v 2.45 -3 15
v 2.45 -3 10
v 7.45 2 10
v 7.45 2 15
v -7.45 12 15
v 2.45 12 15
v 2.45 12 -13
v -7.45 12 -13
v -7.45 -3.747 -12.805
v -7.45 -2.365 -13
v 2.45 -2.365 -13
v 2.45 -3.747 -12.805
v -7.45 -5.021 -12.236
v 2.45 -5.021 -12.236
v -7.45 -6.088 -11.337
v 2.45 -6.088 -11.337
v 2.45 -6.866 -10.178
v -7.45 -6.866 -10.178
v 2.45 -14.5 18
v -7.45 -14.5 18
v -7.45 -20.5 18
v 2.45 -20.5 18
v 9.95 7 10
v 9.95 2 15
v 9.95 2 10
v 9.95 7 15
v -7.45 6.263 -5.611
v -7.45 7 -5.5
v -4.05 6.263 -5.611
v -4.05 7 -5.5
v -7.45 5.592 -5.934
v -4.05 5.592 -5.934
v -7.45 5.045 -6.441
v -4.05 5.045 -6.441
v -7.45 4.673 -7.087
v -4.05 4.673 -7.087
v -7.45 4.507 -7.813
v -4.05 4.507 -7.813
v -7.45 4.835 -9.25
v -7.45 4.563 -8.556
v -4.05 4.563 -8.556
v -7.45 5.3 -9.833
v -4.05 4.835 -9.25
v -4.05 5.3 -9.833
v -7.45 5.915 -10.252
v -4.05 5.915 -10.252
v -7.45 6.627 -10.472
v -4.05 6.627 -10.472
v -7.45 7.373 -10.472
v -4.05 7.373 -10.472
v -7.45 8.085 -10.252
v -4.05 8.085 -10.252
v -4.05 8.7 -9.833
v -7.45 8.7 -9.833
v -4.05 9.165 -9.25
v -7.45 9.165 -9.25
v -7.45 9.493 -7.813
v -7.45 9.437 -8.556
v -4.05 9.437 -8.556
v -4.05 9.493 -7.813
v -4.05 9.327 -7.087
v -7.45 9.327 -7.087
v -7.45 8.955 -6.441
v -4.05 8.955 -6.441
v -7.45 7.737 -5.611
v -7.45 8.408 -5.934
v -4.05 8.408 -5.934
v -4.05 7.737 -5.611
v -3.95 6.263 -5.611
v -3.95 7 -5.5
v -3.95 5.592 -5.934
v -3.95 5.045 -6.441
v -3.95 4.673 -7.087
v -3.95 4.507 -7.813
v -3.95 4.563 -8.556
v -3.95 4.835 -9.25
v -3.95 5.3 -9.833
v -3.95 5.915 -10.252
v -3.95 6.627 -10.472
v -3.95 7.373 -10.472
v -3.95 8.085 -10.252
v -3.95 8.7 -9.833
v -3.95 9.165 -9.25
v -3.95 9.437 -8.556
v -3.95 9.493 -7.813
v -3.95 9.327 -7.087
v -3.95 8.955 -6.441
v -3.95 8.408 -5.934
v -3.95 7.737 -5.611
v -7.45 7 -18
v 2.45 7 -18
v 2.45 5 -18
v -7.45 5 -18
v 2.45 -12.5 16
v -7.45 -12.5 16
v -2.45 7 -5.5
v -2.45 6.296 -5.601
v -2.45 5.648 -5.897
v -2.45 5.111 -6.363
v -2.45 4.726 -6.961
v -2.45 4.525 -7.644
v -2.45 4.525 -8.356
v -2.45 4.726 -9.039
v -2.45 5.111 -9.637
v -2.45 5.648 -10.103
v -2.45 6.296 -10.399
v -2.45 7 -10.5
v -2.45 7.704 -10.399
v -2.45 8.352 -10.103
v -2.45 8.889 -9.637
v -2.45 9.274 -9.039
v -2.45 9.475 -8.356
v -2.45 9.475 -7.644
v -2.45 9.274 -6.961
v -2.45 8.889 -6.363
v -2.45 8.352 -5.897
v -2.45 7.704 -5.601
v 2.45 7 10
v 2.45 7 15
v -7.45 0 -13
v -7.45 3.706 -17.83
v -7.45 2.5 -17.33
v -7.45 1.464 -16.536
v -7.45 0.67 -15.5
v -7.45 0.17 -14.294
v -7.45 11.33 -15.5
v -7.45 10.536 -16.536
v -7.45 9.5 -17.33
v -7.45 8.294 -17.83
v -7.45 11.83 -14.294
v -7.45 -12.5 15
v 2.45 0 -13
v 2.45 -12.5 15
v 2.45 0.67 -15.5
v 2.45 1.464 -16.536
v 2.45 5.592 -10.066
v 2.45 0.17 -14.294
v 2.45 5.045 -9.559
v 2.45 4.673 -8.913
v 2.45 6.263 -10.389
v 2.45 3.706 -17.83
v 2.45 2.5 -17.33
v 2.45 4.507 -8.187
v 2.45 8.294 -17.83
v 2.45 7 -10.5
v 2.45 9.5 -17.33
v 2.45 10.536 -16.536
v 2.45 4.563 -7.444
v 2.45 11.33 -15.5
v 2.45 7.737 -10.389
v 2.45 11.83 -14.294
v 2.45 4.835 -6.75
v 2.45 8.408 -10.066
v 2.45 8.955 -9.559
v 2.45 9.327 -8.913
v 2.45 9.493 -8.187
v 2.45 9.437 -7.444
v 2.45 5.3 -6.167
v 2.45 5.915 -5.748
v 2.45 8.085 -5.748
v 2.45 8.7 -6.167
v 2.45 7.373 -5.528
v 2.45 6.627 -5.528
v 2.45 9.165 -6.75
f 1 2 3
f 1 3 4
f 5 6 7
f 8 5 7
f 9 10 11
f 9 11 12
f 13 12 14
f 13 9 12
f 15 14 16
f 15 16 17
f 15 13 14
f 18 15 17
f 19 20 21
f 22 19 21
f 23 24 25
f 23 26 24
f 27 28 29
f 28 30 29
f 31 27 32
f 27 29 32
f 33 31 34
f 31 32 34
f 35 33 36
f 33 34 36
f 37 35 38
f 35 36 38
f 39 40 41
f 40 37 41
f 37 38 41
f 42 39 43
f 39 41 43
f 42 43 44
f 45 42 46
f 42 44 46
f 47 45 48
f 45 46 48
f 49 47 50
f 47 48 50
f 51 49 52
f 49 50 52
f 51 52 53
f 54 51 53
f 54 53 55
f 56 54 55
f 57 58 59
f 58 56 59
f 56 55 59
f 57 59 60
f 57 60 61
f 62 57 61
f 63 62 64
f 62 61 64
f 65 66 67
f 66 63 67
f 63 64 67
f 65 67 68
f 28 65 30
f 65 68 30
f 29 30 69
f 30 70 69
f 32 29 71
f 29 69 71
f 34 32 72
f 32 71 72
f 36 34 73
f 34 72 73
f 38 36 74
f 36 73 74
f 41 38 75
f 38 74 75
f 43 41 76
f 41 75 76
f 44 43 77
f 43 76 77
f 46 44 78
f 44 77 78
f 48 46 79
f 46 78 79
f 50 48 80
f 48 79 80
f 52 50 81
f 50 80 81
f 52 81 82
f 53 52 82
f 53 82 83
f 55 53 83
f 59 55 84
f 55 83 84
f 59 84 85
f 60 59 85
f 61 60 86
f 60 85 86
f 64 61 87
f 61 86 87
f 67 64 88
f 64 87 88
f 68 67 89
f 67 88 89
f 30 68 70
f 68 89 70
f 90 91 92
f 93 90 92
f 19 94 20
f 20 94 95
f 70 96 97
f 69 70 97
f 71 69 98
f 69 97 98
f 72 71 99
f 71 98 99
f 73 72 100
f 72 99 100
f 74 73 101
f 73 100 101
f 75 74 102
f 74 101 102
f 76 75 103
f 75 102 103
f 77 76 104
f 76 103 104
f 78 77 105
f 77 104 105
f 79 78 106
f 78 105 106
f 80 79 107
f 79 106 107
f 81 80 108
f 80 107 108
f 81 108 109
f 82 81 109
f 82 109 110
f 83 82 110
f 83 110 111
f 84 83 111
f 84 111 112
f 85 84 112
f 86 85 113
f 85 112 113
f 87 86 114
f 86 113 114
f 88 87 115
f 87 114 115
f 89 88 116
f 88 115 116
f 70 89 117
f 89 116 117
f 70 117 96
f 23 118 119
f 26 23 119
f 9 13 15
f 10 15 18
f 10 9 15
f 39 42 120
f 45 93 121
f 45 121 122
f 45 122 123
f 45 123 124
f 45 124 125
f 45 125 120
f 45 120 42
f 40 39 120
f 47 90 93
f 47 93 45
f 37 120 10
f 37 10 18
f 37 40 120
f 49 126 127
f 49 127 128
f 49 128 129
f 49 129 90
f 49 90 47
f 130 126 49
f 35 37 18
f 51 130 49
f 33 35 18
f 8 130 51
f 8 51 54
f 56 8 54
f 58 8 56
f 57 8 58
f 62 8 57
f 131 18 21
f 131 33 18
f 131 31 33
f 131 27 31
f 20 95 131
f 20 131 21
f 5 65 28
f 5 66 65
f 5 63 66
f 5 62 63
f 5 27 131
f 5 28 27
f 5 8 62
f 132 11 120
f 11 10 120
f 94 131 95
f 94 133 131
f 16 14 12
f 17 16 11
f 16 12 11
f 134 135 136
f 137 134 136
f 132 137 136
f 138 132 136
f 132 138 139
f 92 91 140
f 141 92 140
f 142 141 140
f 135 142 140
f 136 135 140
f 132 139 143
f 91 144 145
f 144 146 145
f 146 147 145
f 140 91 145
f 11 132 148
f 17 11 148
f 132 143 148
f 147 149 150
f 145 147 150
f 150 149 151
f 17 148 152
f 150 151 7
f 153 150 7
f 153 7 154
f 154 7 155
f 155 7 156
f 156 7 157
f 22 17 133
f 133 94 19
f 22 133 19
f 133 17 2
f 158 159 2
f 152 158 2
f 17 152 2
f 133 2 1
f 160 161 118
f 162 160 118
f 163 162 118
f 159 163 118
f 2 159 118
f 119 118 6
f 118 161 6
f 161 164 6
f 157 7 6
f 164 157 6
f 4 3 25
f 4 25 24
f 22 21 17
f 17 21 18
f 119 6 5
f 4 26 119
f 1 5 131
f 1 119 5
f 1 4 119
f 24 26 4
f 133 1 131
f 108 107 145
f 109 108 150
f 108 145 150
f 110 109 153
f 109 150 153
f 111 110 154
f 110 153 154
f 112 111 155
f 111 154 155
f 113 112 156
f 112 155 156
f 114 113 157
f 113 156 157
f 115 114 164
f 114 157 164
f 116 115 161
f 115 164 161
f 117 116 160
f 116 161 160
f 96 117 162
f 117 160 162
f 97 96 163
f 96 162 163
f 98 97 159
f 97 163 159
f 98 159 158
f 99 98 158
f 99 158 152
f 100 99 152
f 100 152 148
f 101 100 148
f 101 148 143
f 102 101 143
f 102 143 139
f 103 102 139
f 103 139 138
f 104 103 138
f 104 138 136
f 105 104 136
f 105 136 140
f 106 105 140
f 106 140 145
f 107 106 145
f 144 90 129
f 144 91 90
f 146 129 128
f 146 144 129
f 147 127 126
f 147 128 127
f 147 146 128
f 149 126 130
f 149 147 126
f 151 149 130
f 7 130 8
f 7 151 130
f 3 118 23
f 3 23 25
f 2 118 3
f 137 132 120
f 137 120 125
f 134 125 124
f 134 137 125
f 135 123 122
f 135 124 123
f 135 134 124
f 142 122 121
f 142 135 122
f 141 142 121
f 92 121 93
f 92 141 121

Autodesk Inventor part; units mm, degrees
ref_plane "YZ Plane" through (0, 0, 0) normal (1, 0, 0) x (0, 1, 0)
ref_plane "XZ Plane" through (0, 0, 0) normal (0, 1, 0) x (-1, 0, 0)
ref_plane "XY Plane" through (0, 0, 0) normal (0, 0, 1) x (1, 0, 0)
sketch "Sketch1" plane through (0, 0, 0) normal (0, 1, 0) x (-1, 0, 0)
  line L0 (-2.45, -18) -> (2.45, -18)
  line L1 (2.45, -18) -> (2.45, 18)
  line L2 (2.45, 18) -> (-2.45, 18)
  line L3 (-2.45, 18) -> (-2.45, -18)
  line L4 (-2.45, -18) -> (2.45, 18) construction
  line L5 (2.45, -18) -> (-2.45, 18) construction
  point P0 (0, 0)
  dimension "d0" = 36
  dimension "d1" = 4.9
extrude "Extrusion1" add sketch "Sketch1" along normal blind 12
sketch "Sketch2" plane through (2.45, 0, 18) normal (1, 0, 0) x (0, 0, -1)
  circle A0 centre (26, 7) radius 2.5
  line L0 (36, 0) -> (36, 12) projected
  line L1 (0, 12) -> (36, 12) projected
  point P0 (18, 0)
  dimension "d4" = 5
  dimension "d5" = 10
  dimension "d18" = 5
fillet "Fillet1" radius 5 2 edges at (0, 12, -18) (0, 0, -18)
sketch "Sketch3" plane through (2.45, 0, 18) normal (1, 0, 0) x (0, 0, -1)
  line L0 (0, 0) -> (0, -15)
  arc A0 (36, 7) -> (31, 12) centre (31, 7) ccw projected
  line L1 (0, -15) -> (31, 0)
  line L2 (0, 0) -> (31, 0)
  point P0 (18, 0)
  dimension "d7" = 15
extrude "Extrusion2" cut sketch "Sketch2" against normal blind 10
extrude "Extrusion3" add sketch "Sketch3" against normal blind 5
sketch "Skizze4" plane through (2.45, 12, 18) normal (1, 0, 0) x (0, 0, -1)
  line L0 (8, -10) -> (3, -10)
  line L1 (3, -10) -> (3, -5)
  line L2 (3, -5) -> (8, -5)
  line L3 (8, -5) -> (8, -10)
  line L4 (0, 0) -> (31, 0) projected
  line L5 (0, -27) -> (0, 0) projected
  point P0 (18, -12)
  point P1 (3, -7.5)
  dimension "d12" = 5
  dimension "d13" = 5
  dimension "d14" = 5
  dimension "d15" = 3
extrude "Extrusion4" add sketch "Skizze4" along normal blind 5
sketch "Sketch5" plane through (-2.45, 5, -18) normal (-1, 0, 0) x (0, 0, 1)
  circle A0 centre (10, 2) radius 2.5 projected
  arc A1 (0, 0) -> (5, -5) centre (5, 0) ccw projected
  line L0 (5, -5) -> (36, -5) projected
  line L1 (36, -5) -> (36, 7) projected
  line L2 (5, 7) -> (36, 7) projected
  arc A2 (5, 7) -> (0, 2) centre (5, 2) ccw projected
  line L3 (0, 0) -> (0, 2) projected
  line L4 (5, -5) -> (36, -20) projected
  line L5 (36, -20) -> (36, -5) projected
  line L6 (36, -5) -> (5, -5) projected
  line L7 (5, -5) -> (36, -20) projected
  line L8 (36, -20) -> (36, -5) projected
  line L9 (36, -5) -> (5, -5) projected
  line L10 (5, -5) -> (36, -20) projected
  line L11 (36, -20) -> (36, -5) projected
  line L12 (36, -5) -> (5, -5) projected
  point P0 (18, -5)
extrude "Extrusion5" add sketch "Sketch5" along normal blind 1.5
sketch "Sketch6" plane through (-3.95, 5, -18) normal (-1, 0, 0) x (0, 0, 1)
  line L0 (5, -5) -> (36, -20) projected
  line L1 (36, -20) -> (36, 7) projected
  line L2 (36, 7) -> (5, 7) projected
  arc A0 (5, 7) -> (0, 2) centre (5, 2) ccw projected
  line L3 (0, 2) -> (0, 0) projected
  arc A1 (0, 0) -> (5, -5) centre (5, 0) ccw projected
  circle A2 centre (10, 2) radius 2.5 projected
  point P0 (18, -5)
extrude "Extrusion6" add sketch "Sketch6" along normal blind 0.1
sketch "Sketch7" plane through (2.45, 2, 10) normal (0, -1, 0) x (1, 0, 0)
  line L0 (0, 0) -> (0, 5) projected
  line L1 (0, 0) -> (5, 0) projected
  line L2 (5, 5) -> (5, 0) projected
  line L3 (0, 5) -> (5, 5) projected
  point P0 (-2.45, -10)
extrude "Extrusion7" add sketch "Sketch7" along normal blind 5
chamfer "Chamfer1" distance 5 angle 45 1 edges at (7.45, -3, 12.5)
sketch "Sketch8" plane through (-4.05, 5, -18) normal (-1, 0, 0) x (0, 0, 1)
  line L0 (36, -20) -> (36, 7) projected
  line L1 (36, 7) -> (5, 7) projected
  arc A0 (5, 7) -> (0, 2) centre (5, 2) ccw projected
  line L2 (0, 2) -> (0, 0) projected
  arc A1 (0, 0) -> (5, -5) centre (5, 0) ccw projected
  line L3 (5, -5) -> (36, -20) projected
  circle A2 centre (10, 2) radius 2.5 projected
  point P0 (18, -5)
extrude "Extrusion8" add sketch "Sketch8" along normal blind 3.4
sketch "Sketch9" plane through (7.45, 12, 18) normal (1, 0, 0) x (0, 0, -1)
  line L0 (8, -10) -> (3, -10) construction
  line L1 (8, -5) -> (8, -10) construction
  line L2 (8, -5) -> (3, -5) construction
  line L3 (3, -5) -> (3, -10) construction
  line L4 (8, -10) -> (3, -10) projected
  line L5 (8, -5) -> (8, -10) projected
  line L6 (8, -5) -> (3, -5) projected
  line L7 (3, -5) -> (3, -10) projected
  point P0 (18, -12)
extrude "Extrusion9" add sketch "Sketch9" along normal blind 2.5
sketch "Sketch10" plane through (-7.45, 0, -13) normal (0, -0.9001593, -0.4355609) x (1, 0, 0)
  point P0 (7.45, 11.7021)
sketch "Sketch11" plane through (-7.45, 0, -13) normal (0, -0.9001593, -0.4355609) x (1, 0, 0)
  point P0 (7.45, 11.7021)
sketch "Sketch12" plane through (-7.45, 5, -18) normal (-1, 0, 0) x (0, 0, 1)
  line L0 (36, -20) -> (36, -25.5)
  line L1 (36, -25.5) -> (5, -10.5)
  line L2 (5, -10.5) -> (5, -5)
  arc A0 (0, 0) -> (5, -5) centre (5, 0) ccw projected
  line L3 (5, -5) -> (36, -20)
  point P0 (18, -5)
  dimension "d32" = 5.5
  dimension "d33" = 5.5
extrude "Extrusion10" add sketch "Sketch12" against normal blind 9.9
fillet "Fillet2" radius 5 1 edges at (-2.5, -5.5, -13)
fillet "Fillet3" [suppressed]
sketch "Sketch13" plane through (2.45, 5, -18) normal (1, 0, 0) x (0, 0, -1)
  line L0 (-36, 7) -> (-36, -25.5) projected
  line L1 (-36, 7) -> (-33, 7)
  line L2 (-33, 7) -> (-33, -17.5)
  line L3 (-33, -17.5) -> (-36, -17.5)
  line L4 (-36, -17.5) -> (-36, 7)
  point P0 (-18, -5)
  point P1 (-36, -17.5)
  dimension "d40" = 24.5
extrude "Extrusion11" cut sketch "Sketch13" against normal blind 10
chamfer "Chamfer2" distance 2 angle 45 1 edges at (-5.75, -12.5, 18)
properties part number "HoldingTri"
